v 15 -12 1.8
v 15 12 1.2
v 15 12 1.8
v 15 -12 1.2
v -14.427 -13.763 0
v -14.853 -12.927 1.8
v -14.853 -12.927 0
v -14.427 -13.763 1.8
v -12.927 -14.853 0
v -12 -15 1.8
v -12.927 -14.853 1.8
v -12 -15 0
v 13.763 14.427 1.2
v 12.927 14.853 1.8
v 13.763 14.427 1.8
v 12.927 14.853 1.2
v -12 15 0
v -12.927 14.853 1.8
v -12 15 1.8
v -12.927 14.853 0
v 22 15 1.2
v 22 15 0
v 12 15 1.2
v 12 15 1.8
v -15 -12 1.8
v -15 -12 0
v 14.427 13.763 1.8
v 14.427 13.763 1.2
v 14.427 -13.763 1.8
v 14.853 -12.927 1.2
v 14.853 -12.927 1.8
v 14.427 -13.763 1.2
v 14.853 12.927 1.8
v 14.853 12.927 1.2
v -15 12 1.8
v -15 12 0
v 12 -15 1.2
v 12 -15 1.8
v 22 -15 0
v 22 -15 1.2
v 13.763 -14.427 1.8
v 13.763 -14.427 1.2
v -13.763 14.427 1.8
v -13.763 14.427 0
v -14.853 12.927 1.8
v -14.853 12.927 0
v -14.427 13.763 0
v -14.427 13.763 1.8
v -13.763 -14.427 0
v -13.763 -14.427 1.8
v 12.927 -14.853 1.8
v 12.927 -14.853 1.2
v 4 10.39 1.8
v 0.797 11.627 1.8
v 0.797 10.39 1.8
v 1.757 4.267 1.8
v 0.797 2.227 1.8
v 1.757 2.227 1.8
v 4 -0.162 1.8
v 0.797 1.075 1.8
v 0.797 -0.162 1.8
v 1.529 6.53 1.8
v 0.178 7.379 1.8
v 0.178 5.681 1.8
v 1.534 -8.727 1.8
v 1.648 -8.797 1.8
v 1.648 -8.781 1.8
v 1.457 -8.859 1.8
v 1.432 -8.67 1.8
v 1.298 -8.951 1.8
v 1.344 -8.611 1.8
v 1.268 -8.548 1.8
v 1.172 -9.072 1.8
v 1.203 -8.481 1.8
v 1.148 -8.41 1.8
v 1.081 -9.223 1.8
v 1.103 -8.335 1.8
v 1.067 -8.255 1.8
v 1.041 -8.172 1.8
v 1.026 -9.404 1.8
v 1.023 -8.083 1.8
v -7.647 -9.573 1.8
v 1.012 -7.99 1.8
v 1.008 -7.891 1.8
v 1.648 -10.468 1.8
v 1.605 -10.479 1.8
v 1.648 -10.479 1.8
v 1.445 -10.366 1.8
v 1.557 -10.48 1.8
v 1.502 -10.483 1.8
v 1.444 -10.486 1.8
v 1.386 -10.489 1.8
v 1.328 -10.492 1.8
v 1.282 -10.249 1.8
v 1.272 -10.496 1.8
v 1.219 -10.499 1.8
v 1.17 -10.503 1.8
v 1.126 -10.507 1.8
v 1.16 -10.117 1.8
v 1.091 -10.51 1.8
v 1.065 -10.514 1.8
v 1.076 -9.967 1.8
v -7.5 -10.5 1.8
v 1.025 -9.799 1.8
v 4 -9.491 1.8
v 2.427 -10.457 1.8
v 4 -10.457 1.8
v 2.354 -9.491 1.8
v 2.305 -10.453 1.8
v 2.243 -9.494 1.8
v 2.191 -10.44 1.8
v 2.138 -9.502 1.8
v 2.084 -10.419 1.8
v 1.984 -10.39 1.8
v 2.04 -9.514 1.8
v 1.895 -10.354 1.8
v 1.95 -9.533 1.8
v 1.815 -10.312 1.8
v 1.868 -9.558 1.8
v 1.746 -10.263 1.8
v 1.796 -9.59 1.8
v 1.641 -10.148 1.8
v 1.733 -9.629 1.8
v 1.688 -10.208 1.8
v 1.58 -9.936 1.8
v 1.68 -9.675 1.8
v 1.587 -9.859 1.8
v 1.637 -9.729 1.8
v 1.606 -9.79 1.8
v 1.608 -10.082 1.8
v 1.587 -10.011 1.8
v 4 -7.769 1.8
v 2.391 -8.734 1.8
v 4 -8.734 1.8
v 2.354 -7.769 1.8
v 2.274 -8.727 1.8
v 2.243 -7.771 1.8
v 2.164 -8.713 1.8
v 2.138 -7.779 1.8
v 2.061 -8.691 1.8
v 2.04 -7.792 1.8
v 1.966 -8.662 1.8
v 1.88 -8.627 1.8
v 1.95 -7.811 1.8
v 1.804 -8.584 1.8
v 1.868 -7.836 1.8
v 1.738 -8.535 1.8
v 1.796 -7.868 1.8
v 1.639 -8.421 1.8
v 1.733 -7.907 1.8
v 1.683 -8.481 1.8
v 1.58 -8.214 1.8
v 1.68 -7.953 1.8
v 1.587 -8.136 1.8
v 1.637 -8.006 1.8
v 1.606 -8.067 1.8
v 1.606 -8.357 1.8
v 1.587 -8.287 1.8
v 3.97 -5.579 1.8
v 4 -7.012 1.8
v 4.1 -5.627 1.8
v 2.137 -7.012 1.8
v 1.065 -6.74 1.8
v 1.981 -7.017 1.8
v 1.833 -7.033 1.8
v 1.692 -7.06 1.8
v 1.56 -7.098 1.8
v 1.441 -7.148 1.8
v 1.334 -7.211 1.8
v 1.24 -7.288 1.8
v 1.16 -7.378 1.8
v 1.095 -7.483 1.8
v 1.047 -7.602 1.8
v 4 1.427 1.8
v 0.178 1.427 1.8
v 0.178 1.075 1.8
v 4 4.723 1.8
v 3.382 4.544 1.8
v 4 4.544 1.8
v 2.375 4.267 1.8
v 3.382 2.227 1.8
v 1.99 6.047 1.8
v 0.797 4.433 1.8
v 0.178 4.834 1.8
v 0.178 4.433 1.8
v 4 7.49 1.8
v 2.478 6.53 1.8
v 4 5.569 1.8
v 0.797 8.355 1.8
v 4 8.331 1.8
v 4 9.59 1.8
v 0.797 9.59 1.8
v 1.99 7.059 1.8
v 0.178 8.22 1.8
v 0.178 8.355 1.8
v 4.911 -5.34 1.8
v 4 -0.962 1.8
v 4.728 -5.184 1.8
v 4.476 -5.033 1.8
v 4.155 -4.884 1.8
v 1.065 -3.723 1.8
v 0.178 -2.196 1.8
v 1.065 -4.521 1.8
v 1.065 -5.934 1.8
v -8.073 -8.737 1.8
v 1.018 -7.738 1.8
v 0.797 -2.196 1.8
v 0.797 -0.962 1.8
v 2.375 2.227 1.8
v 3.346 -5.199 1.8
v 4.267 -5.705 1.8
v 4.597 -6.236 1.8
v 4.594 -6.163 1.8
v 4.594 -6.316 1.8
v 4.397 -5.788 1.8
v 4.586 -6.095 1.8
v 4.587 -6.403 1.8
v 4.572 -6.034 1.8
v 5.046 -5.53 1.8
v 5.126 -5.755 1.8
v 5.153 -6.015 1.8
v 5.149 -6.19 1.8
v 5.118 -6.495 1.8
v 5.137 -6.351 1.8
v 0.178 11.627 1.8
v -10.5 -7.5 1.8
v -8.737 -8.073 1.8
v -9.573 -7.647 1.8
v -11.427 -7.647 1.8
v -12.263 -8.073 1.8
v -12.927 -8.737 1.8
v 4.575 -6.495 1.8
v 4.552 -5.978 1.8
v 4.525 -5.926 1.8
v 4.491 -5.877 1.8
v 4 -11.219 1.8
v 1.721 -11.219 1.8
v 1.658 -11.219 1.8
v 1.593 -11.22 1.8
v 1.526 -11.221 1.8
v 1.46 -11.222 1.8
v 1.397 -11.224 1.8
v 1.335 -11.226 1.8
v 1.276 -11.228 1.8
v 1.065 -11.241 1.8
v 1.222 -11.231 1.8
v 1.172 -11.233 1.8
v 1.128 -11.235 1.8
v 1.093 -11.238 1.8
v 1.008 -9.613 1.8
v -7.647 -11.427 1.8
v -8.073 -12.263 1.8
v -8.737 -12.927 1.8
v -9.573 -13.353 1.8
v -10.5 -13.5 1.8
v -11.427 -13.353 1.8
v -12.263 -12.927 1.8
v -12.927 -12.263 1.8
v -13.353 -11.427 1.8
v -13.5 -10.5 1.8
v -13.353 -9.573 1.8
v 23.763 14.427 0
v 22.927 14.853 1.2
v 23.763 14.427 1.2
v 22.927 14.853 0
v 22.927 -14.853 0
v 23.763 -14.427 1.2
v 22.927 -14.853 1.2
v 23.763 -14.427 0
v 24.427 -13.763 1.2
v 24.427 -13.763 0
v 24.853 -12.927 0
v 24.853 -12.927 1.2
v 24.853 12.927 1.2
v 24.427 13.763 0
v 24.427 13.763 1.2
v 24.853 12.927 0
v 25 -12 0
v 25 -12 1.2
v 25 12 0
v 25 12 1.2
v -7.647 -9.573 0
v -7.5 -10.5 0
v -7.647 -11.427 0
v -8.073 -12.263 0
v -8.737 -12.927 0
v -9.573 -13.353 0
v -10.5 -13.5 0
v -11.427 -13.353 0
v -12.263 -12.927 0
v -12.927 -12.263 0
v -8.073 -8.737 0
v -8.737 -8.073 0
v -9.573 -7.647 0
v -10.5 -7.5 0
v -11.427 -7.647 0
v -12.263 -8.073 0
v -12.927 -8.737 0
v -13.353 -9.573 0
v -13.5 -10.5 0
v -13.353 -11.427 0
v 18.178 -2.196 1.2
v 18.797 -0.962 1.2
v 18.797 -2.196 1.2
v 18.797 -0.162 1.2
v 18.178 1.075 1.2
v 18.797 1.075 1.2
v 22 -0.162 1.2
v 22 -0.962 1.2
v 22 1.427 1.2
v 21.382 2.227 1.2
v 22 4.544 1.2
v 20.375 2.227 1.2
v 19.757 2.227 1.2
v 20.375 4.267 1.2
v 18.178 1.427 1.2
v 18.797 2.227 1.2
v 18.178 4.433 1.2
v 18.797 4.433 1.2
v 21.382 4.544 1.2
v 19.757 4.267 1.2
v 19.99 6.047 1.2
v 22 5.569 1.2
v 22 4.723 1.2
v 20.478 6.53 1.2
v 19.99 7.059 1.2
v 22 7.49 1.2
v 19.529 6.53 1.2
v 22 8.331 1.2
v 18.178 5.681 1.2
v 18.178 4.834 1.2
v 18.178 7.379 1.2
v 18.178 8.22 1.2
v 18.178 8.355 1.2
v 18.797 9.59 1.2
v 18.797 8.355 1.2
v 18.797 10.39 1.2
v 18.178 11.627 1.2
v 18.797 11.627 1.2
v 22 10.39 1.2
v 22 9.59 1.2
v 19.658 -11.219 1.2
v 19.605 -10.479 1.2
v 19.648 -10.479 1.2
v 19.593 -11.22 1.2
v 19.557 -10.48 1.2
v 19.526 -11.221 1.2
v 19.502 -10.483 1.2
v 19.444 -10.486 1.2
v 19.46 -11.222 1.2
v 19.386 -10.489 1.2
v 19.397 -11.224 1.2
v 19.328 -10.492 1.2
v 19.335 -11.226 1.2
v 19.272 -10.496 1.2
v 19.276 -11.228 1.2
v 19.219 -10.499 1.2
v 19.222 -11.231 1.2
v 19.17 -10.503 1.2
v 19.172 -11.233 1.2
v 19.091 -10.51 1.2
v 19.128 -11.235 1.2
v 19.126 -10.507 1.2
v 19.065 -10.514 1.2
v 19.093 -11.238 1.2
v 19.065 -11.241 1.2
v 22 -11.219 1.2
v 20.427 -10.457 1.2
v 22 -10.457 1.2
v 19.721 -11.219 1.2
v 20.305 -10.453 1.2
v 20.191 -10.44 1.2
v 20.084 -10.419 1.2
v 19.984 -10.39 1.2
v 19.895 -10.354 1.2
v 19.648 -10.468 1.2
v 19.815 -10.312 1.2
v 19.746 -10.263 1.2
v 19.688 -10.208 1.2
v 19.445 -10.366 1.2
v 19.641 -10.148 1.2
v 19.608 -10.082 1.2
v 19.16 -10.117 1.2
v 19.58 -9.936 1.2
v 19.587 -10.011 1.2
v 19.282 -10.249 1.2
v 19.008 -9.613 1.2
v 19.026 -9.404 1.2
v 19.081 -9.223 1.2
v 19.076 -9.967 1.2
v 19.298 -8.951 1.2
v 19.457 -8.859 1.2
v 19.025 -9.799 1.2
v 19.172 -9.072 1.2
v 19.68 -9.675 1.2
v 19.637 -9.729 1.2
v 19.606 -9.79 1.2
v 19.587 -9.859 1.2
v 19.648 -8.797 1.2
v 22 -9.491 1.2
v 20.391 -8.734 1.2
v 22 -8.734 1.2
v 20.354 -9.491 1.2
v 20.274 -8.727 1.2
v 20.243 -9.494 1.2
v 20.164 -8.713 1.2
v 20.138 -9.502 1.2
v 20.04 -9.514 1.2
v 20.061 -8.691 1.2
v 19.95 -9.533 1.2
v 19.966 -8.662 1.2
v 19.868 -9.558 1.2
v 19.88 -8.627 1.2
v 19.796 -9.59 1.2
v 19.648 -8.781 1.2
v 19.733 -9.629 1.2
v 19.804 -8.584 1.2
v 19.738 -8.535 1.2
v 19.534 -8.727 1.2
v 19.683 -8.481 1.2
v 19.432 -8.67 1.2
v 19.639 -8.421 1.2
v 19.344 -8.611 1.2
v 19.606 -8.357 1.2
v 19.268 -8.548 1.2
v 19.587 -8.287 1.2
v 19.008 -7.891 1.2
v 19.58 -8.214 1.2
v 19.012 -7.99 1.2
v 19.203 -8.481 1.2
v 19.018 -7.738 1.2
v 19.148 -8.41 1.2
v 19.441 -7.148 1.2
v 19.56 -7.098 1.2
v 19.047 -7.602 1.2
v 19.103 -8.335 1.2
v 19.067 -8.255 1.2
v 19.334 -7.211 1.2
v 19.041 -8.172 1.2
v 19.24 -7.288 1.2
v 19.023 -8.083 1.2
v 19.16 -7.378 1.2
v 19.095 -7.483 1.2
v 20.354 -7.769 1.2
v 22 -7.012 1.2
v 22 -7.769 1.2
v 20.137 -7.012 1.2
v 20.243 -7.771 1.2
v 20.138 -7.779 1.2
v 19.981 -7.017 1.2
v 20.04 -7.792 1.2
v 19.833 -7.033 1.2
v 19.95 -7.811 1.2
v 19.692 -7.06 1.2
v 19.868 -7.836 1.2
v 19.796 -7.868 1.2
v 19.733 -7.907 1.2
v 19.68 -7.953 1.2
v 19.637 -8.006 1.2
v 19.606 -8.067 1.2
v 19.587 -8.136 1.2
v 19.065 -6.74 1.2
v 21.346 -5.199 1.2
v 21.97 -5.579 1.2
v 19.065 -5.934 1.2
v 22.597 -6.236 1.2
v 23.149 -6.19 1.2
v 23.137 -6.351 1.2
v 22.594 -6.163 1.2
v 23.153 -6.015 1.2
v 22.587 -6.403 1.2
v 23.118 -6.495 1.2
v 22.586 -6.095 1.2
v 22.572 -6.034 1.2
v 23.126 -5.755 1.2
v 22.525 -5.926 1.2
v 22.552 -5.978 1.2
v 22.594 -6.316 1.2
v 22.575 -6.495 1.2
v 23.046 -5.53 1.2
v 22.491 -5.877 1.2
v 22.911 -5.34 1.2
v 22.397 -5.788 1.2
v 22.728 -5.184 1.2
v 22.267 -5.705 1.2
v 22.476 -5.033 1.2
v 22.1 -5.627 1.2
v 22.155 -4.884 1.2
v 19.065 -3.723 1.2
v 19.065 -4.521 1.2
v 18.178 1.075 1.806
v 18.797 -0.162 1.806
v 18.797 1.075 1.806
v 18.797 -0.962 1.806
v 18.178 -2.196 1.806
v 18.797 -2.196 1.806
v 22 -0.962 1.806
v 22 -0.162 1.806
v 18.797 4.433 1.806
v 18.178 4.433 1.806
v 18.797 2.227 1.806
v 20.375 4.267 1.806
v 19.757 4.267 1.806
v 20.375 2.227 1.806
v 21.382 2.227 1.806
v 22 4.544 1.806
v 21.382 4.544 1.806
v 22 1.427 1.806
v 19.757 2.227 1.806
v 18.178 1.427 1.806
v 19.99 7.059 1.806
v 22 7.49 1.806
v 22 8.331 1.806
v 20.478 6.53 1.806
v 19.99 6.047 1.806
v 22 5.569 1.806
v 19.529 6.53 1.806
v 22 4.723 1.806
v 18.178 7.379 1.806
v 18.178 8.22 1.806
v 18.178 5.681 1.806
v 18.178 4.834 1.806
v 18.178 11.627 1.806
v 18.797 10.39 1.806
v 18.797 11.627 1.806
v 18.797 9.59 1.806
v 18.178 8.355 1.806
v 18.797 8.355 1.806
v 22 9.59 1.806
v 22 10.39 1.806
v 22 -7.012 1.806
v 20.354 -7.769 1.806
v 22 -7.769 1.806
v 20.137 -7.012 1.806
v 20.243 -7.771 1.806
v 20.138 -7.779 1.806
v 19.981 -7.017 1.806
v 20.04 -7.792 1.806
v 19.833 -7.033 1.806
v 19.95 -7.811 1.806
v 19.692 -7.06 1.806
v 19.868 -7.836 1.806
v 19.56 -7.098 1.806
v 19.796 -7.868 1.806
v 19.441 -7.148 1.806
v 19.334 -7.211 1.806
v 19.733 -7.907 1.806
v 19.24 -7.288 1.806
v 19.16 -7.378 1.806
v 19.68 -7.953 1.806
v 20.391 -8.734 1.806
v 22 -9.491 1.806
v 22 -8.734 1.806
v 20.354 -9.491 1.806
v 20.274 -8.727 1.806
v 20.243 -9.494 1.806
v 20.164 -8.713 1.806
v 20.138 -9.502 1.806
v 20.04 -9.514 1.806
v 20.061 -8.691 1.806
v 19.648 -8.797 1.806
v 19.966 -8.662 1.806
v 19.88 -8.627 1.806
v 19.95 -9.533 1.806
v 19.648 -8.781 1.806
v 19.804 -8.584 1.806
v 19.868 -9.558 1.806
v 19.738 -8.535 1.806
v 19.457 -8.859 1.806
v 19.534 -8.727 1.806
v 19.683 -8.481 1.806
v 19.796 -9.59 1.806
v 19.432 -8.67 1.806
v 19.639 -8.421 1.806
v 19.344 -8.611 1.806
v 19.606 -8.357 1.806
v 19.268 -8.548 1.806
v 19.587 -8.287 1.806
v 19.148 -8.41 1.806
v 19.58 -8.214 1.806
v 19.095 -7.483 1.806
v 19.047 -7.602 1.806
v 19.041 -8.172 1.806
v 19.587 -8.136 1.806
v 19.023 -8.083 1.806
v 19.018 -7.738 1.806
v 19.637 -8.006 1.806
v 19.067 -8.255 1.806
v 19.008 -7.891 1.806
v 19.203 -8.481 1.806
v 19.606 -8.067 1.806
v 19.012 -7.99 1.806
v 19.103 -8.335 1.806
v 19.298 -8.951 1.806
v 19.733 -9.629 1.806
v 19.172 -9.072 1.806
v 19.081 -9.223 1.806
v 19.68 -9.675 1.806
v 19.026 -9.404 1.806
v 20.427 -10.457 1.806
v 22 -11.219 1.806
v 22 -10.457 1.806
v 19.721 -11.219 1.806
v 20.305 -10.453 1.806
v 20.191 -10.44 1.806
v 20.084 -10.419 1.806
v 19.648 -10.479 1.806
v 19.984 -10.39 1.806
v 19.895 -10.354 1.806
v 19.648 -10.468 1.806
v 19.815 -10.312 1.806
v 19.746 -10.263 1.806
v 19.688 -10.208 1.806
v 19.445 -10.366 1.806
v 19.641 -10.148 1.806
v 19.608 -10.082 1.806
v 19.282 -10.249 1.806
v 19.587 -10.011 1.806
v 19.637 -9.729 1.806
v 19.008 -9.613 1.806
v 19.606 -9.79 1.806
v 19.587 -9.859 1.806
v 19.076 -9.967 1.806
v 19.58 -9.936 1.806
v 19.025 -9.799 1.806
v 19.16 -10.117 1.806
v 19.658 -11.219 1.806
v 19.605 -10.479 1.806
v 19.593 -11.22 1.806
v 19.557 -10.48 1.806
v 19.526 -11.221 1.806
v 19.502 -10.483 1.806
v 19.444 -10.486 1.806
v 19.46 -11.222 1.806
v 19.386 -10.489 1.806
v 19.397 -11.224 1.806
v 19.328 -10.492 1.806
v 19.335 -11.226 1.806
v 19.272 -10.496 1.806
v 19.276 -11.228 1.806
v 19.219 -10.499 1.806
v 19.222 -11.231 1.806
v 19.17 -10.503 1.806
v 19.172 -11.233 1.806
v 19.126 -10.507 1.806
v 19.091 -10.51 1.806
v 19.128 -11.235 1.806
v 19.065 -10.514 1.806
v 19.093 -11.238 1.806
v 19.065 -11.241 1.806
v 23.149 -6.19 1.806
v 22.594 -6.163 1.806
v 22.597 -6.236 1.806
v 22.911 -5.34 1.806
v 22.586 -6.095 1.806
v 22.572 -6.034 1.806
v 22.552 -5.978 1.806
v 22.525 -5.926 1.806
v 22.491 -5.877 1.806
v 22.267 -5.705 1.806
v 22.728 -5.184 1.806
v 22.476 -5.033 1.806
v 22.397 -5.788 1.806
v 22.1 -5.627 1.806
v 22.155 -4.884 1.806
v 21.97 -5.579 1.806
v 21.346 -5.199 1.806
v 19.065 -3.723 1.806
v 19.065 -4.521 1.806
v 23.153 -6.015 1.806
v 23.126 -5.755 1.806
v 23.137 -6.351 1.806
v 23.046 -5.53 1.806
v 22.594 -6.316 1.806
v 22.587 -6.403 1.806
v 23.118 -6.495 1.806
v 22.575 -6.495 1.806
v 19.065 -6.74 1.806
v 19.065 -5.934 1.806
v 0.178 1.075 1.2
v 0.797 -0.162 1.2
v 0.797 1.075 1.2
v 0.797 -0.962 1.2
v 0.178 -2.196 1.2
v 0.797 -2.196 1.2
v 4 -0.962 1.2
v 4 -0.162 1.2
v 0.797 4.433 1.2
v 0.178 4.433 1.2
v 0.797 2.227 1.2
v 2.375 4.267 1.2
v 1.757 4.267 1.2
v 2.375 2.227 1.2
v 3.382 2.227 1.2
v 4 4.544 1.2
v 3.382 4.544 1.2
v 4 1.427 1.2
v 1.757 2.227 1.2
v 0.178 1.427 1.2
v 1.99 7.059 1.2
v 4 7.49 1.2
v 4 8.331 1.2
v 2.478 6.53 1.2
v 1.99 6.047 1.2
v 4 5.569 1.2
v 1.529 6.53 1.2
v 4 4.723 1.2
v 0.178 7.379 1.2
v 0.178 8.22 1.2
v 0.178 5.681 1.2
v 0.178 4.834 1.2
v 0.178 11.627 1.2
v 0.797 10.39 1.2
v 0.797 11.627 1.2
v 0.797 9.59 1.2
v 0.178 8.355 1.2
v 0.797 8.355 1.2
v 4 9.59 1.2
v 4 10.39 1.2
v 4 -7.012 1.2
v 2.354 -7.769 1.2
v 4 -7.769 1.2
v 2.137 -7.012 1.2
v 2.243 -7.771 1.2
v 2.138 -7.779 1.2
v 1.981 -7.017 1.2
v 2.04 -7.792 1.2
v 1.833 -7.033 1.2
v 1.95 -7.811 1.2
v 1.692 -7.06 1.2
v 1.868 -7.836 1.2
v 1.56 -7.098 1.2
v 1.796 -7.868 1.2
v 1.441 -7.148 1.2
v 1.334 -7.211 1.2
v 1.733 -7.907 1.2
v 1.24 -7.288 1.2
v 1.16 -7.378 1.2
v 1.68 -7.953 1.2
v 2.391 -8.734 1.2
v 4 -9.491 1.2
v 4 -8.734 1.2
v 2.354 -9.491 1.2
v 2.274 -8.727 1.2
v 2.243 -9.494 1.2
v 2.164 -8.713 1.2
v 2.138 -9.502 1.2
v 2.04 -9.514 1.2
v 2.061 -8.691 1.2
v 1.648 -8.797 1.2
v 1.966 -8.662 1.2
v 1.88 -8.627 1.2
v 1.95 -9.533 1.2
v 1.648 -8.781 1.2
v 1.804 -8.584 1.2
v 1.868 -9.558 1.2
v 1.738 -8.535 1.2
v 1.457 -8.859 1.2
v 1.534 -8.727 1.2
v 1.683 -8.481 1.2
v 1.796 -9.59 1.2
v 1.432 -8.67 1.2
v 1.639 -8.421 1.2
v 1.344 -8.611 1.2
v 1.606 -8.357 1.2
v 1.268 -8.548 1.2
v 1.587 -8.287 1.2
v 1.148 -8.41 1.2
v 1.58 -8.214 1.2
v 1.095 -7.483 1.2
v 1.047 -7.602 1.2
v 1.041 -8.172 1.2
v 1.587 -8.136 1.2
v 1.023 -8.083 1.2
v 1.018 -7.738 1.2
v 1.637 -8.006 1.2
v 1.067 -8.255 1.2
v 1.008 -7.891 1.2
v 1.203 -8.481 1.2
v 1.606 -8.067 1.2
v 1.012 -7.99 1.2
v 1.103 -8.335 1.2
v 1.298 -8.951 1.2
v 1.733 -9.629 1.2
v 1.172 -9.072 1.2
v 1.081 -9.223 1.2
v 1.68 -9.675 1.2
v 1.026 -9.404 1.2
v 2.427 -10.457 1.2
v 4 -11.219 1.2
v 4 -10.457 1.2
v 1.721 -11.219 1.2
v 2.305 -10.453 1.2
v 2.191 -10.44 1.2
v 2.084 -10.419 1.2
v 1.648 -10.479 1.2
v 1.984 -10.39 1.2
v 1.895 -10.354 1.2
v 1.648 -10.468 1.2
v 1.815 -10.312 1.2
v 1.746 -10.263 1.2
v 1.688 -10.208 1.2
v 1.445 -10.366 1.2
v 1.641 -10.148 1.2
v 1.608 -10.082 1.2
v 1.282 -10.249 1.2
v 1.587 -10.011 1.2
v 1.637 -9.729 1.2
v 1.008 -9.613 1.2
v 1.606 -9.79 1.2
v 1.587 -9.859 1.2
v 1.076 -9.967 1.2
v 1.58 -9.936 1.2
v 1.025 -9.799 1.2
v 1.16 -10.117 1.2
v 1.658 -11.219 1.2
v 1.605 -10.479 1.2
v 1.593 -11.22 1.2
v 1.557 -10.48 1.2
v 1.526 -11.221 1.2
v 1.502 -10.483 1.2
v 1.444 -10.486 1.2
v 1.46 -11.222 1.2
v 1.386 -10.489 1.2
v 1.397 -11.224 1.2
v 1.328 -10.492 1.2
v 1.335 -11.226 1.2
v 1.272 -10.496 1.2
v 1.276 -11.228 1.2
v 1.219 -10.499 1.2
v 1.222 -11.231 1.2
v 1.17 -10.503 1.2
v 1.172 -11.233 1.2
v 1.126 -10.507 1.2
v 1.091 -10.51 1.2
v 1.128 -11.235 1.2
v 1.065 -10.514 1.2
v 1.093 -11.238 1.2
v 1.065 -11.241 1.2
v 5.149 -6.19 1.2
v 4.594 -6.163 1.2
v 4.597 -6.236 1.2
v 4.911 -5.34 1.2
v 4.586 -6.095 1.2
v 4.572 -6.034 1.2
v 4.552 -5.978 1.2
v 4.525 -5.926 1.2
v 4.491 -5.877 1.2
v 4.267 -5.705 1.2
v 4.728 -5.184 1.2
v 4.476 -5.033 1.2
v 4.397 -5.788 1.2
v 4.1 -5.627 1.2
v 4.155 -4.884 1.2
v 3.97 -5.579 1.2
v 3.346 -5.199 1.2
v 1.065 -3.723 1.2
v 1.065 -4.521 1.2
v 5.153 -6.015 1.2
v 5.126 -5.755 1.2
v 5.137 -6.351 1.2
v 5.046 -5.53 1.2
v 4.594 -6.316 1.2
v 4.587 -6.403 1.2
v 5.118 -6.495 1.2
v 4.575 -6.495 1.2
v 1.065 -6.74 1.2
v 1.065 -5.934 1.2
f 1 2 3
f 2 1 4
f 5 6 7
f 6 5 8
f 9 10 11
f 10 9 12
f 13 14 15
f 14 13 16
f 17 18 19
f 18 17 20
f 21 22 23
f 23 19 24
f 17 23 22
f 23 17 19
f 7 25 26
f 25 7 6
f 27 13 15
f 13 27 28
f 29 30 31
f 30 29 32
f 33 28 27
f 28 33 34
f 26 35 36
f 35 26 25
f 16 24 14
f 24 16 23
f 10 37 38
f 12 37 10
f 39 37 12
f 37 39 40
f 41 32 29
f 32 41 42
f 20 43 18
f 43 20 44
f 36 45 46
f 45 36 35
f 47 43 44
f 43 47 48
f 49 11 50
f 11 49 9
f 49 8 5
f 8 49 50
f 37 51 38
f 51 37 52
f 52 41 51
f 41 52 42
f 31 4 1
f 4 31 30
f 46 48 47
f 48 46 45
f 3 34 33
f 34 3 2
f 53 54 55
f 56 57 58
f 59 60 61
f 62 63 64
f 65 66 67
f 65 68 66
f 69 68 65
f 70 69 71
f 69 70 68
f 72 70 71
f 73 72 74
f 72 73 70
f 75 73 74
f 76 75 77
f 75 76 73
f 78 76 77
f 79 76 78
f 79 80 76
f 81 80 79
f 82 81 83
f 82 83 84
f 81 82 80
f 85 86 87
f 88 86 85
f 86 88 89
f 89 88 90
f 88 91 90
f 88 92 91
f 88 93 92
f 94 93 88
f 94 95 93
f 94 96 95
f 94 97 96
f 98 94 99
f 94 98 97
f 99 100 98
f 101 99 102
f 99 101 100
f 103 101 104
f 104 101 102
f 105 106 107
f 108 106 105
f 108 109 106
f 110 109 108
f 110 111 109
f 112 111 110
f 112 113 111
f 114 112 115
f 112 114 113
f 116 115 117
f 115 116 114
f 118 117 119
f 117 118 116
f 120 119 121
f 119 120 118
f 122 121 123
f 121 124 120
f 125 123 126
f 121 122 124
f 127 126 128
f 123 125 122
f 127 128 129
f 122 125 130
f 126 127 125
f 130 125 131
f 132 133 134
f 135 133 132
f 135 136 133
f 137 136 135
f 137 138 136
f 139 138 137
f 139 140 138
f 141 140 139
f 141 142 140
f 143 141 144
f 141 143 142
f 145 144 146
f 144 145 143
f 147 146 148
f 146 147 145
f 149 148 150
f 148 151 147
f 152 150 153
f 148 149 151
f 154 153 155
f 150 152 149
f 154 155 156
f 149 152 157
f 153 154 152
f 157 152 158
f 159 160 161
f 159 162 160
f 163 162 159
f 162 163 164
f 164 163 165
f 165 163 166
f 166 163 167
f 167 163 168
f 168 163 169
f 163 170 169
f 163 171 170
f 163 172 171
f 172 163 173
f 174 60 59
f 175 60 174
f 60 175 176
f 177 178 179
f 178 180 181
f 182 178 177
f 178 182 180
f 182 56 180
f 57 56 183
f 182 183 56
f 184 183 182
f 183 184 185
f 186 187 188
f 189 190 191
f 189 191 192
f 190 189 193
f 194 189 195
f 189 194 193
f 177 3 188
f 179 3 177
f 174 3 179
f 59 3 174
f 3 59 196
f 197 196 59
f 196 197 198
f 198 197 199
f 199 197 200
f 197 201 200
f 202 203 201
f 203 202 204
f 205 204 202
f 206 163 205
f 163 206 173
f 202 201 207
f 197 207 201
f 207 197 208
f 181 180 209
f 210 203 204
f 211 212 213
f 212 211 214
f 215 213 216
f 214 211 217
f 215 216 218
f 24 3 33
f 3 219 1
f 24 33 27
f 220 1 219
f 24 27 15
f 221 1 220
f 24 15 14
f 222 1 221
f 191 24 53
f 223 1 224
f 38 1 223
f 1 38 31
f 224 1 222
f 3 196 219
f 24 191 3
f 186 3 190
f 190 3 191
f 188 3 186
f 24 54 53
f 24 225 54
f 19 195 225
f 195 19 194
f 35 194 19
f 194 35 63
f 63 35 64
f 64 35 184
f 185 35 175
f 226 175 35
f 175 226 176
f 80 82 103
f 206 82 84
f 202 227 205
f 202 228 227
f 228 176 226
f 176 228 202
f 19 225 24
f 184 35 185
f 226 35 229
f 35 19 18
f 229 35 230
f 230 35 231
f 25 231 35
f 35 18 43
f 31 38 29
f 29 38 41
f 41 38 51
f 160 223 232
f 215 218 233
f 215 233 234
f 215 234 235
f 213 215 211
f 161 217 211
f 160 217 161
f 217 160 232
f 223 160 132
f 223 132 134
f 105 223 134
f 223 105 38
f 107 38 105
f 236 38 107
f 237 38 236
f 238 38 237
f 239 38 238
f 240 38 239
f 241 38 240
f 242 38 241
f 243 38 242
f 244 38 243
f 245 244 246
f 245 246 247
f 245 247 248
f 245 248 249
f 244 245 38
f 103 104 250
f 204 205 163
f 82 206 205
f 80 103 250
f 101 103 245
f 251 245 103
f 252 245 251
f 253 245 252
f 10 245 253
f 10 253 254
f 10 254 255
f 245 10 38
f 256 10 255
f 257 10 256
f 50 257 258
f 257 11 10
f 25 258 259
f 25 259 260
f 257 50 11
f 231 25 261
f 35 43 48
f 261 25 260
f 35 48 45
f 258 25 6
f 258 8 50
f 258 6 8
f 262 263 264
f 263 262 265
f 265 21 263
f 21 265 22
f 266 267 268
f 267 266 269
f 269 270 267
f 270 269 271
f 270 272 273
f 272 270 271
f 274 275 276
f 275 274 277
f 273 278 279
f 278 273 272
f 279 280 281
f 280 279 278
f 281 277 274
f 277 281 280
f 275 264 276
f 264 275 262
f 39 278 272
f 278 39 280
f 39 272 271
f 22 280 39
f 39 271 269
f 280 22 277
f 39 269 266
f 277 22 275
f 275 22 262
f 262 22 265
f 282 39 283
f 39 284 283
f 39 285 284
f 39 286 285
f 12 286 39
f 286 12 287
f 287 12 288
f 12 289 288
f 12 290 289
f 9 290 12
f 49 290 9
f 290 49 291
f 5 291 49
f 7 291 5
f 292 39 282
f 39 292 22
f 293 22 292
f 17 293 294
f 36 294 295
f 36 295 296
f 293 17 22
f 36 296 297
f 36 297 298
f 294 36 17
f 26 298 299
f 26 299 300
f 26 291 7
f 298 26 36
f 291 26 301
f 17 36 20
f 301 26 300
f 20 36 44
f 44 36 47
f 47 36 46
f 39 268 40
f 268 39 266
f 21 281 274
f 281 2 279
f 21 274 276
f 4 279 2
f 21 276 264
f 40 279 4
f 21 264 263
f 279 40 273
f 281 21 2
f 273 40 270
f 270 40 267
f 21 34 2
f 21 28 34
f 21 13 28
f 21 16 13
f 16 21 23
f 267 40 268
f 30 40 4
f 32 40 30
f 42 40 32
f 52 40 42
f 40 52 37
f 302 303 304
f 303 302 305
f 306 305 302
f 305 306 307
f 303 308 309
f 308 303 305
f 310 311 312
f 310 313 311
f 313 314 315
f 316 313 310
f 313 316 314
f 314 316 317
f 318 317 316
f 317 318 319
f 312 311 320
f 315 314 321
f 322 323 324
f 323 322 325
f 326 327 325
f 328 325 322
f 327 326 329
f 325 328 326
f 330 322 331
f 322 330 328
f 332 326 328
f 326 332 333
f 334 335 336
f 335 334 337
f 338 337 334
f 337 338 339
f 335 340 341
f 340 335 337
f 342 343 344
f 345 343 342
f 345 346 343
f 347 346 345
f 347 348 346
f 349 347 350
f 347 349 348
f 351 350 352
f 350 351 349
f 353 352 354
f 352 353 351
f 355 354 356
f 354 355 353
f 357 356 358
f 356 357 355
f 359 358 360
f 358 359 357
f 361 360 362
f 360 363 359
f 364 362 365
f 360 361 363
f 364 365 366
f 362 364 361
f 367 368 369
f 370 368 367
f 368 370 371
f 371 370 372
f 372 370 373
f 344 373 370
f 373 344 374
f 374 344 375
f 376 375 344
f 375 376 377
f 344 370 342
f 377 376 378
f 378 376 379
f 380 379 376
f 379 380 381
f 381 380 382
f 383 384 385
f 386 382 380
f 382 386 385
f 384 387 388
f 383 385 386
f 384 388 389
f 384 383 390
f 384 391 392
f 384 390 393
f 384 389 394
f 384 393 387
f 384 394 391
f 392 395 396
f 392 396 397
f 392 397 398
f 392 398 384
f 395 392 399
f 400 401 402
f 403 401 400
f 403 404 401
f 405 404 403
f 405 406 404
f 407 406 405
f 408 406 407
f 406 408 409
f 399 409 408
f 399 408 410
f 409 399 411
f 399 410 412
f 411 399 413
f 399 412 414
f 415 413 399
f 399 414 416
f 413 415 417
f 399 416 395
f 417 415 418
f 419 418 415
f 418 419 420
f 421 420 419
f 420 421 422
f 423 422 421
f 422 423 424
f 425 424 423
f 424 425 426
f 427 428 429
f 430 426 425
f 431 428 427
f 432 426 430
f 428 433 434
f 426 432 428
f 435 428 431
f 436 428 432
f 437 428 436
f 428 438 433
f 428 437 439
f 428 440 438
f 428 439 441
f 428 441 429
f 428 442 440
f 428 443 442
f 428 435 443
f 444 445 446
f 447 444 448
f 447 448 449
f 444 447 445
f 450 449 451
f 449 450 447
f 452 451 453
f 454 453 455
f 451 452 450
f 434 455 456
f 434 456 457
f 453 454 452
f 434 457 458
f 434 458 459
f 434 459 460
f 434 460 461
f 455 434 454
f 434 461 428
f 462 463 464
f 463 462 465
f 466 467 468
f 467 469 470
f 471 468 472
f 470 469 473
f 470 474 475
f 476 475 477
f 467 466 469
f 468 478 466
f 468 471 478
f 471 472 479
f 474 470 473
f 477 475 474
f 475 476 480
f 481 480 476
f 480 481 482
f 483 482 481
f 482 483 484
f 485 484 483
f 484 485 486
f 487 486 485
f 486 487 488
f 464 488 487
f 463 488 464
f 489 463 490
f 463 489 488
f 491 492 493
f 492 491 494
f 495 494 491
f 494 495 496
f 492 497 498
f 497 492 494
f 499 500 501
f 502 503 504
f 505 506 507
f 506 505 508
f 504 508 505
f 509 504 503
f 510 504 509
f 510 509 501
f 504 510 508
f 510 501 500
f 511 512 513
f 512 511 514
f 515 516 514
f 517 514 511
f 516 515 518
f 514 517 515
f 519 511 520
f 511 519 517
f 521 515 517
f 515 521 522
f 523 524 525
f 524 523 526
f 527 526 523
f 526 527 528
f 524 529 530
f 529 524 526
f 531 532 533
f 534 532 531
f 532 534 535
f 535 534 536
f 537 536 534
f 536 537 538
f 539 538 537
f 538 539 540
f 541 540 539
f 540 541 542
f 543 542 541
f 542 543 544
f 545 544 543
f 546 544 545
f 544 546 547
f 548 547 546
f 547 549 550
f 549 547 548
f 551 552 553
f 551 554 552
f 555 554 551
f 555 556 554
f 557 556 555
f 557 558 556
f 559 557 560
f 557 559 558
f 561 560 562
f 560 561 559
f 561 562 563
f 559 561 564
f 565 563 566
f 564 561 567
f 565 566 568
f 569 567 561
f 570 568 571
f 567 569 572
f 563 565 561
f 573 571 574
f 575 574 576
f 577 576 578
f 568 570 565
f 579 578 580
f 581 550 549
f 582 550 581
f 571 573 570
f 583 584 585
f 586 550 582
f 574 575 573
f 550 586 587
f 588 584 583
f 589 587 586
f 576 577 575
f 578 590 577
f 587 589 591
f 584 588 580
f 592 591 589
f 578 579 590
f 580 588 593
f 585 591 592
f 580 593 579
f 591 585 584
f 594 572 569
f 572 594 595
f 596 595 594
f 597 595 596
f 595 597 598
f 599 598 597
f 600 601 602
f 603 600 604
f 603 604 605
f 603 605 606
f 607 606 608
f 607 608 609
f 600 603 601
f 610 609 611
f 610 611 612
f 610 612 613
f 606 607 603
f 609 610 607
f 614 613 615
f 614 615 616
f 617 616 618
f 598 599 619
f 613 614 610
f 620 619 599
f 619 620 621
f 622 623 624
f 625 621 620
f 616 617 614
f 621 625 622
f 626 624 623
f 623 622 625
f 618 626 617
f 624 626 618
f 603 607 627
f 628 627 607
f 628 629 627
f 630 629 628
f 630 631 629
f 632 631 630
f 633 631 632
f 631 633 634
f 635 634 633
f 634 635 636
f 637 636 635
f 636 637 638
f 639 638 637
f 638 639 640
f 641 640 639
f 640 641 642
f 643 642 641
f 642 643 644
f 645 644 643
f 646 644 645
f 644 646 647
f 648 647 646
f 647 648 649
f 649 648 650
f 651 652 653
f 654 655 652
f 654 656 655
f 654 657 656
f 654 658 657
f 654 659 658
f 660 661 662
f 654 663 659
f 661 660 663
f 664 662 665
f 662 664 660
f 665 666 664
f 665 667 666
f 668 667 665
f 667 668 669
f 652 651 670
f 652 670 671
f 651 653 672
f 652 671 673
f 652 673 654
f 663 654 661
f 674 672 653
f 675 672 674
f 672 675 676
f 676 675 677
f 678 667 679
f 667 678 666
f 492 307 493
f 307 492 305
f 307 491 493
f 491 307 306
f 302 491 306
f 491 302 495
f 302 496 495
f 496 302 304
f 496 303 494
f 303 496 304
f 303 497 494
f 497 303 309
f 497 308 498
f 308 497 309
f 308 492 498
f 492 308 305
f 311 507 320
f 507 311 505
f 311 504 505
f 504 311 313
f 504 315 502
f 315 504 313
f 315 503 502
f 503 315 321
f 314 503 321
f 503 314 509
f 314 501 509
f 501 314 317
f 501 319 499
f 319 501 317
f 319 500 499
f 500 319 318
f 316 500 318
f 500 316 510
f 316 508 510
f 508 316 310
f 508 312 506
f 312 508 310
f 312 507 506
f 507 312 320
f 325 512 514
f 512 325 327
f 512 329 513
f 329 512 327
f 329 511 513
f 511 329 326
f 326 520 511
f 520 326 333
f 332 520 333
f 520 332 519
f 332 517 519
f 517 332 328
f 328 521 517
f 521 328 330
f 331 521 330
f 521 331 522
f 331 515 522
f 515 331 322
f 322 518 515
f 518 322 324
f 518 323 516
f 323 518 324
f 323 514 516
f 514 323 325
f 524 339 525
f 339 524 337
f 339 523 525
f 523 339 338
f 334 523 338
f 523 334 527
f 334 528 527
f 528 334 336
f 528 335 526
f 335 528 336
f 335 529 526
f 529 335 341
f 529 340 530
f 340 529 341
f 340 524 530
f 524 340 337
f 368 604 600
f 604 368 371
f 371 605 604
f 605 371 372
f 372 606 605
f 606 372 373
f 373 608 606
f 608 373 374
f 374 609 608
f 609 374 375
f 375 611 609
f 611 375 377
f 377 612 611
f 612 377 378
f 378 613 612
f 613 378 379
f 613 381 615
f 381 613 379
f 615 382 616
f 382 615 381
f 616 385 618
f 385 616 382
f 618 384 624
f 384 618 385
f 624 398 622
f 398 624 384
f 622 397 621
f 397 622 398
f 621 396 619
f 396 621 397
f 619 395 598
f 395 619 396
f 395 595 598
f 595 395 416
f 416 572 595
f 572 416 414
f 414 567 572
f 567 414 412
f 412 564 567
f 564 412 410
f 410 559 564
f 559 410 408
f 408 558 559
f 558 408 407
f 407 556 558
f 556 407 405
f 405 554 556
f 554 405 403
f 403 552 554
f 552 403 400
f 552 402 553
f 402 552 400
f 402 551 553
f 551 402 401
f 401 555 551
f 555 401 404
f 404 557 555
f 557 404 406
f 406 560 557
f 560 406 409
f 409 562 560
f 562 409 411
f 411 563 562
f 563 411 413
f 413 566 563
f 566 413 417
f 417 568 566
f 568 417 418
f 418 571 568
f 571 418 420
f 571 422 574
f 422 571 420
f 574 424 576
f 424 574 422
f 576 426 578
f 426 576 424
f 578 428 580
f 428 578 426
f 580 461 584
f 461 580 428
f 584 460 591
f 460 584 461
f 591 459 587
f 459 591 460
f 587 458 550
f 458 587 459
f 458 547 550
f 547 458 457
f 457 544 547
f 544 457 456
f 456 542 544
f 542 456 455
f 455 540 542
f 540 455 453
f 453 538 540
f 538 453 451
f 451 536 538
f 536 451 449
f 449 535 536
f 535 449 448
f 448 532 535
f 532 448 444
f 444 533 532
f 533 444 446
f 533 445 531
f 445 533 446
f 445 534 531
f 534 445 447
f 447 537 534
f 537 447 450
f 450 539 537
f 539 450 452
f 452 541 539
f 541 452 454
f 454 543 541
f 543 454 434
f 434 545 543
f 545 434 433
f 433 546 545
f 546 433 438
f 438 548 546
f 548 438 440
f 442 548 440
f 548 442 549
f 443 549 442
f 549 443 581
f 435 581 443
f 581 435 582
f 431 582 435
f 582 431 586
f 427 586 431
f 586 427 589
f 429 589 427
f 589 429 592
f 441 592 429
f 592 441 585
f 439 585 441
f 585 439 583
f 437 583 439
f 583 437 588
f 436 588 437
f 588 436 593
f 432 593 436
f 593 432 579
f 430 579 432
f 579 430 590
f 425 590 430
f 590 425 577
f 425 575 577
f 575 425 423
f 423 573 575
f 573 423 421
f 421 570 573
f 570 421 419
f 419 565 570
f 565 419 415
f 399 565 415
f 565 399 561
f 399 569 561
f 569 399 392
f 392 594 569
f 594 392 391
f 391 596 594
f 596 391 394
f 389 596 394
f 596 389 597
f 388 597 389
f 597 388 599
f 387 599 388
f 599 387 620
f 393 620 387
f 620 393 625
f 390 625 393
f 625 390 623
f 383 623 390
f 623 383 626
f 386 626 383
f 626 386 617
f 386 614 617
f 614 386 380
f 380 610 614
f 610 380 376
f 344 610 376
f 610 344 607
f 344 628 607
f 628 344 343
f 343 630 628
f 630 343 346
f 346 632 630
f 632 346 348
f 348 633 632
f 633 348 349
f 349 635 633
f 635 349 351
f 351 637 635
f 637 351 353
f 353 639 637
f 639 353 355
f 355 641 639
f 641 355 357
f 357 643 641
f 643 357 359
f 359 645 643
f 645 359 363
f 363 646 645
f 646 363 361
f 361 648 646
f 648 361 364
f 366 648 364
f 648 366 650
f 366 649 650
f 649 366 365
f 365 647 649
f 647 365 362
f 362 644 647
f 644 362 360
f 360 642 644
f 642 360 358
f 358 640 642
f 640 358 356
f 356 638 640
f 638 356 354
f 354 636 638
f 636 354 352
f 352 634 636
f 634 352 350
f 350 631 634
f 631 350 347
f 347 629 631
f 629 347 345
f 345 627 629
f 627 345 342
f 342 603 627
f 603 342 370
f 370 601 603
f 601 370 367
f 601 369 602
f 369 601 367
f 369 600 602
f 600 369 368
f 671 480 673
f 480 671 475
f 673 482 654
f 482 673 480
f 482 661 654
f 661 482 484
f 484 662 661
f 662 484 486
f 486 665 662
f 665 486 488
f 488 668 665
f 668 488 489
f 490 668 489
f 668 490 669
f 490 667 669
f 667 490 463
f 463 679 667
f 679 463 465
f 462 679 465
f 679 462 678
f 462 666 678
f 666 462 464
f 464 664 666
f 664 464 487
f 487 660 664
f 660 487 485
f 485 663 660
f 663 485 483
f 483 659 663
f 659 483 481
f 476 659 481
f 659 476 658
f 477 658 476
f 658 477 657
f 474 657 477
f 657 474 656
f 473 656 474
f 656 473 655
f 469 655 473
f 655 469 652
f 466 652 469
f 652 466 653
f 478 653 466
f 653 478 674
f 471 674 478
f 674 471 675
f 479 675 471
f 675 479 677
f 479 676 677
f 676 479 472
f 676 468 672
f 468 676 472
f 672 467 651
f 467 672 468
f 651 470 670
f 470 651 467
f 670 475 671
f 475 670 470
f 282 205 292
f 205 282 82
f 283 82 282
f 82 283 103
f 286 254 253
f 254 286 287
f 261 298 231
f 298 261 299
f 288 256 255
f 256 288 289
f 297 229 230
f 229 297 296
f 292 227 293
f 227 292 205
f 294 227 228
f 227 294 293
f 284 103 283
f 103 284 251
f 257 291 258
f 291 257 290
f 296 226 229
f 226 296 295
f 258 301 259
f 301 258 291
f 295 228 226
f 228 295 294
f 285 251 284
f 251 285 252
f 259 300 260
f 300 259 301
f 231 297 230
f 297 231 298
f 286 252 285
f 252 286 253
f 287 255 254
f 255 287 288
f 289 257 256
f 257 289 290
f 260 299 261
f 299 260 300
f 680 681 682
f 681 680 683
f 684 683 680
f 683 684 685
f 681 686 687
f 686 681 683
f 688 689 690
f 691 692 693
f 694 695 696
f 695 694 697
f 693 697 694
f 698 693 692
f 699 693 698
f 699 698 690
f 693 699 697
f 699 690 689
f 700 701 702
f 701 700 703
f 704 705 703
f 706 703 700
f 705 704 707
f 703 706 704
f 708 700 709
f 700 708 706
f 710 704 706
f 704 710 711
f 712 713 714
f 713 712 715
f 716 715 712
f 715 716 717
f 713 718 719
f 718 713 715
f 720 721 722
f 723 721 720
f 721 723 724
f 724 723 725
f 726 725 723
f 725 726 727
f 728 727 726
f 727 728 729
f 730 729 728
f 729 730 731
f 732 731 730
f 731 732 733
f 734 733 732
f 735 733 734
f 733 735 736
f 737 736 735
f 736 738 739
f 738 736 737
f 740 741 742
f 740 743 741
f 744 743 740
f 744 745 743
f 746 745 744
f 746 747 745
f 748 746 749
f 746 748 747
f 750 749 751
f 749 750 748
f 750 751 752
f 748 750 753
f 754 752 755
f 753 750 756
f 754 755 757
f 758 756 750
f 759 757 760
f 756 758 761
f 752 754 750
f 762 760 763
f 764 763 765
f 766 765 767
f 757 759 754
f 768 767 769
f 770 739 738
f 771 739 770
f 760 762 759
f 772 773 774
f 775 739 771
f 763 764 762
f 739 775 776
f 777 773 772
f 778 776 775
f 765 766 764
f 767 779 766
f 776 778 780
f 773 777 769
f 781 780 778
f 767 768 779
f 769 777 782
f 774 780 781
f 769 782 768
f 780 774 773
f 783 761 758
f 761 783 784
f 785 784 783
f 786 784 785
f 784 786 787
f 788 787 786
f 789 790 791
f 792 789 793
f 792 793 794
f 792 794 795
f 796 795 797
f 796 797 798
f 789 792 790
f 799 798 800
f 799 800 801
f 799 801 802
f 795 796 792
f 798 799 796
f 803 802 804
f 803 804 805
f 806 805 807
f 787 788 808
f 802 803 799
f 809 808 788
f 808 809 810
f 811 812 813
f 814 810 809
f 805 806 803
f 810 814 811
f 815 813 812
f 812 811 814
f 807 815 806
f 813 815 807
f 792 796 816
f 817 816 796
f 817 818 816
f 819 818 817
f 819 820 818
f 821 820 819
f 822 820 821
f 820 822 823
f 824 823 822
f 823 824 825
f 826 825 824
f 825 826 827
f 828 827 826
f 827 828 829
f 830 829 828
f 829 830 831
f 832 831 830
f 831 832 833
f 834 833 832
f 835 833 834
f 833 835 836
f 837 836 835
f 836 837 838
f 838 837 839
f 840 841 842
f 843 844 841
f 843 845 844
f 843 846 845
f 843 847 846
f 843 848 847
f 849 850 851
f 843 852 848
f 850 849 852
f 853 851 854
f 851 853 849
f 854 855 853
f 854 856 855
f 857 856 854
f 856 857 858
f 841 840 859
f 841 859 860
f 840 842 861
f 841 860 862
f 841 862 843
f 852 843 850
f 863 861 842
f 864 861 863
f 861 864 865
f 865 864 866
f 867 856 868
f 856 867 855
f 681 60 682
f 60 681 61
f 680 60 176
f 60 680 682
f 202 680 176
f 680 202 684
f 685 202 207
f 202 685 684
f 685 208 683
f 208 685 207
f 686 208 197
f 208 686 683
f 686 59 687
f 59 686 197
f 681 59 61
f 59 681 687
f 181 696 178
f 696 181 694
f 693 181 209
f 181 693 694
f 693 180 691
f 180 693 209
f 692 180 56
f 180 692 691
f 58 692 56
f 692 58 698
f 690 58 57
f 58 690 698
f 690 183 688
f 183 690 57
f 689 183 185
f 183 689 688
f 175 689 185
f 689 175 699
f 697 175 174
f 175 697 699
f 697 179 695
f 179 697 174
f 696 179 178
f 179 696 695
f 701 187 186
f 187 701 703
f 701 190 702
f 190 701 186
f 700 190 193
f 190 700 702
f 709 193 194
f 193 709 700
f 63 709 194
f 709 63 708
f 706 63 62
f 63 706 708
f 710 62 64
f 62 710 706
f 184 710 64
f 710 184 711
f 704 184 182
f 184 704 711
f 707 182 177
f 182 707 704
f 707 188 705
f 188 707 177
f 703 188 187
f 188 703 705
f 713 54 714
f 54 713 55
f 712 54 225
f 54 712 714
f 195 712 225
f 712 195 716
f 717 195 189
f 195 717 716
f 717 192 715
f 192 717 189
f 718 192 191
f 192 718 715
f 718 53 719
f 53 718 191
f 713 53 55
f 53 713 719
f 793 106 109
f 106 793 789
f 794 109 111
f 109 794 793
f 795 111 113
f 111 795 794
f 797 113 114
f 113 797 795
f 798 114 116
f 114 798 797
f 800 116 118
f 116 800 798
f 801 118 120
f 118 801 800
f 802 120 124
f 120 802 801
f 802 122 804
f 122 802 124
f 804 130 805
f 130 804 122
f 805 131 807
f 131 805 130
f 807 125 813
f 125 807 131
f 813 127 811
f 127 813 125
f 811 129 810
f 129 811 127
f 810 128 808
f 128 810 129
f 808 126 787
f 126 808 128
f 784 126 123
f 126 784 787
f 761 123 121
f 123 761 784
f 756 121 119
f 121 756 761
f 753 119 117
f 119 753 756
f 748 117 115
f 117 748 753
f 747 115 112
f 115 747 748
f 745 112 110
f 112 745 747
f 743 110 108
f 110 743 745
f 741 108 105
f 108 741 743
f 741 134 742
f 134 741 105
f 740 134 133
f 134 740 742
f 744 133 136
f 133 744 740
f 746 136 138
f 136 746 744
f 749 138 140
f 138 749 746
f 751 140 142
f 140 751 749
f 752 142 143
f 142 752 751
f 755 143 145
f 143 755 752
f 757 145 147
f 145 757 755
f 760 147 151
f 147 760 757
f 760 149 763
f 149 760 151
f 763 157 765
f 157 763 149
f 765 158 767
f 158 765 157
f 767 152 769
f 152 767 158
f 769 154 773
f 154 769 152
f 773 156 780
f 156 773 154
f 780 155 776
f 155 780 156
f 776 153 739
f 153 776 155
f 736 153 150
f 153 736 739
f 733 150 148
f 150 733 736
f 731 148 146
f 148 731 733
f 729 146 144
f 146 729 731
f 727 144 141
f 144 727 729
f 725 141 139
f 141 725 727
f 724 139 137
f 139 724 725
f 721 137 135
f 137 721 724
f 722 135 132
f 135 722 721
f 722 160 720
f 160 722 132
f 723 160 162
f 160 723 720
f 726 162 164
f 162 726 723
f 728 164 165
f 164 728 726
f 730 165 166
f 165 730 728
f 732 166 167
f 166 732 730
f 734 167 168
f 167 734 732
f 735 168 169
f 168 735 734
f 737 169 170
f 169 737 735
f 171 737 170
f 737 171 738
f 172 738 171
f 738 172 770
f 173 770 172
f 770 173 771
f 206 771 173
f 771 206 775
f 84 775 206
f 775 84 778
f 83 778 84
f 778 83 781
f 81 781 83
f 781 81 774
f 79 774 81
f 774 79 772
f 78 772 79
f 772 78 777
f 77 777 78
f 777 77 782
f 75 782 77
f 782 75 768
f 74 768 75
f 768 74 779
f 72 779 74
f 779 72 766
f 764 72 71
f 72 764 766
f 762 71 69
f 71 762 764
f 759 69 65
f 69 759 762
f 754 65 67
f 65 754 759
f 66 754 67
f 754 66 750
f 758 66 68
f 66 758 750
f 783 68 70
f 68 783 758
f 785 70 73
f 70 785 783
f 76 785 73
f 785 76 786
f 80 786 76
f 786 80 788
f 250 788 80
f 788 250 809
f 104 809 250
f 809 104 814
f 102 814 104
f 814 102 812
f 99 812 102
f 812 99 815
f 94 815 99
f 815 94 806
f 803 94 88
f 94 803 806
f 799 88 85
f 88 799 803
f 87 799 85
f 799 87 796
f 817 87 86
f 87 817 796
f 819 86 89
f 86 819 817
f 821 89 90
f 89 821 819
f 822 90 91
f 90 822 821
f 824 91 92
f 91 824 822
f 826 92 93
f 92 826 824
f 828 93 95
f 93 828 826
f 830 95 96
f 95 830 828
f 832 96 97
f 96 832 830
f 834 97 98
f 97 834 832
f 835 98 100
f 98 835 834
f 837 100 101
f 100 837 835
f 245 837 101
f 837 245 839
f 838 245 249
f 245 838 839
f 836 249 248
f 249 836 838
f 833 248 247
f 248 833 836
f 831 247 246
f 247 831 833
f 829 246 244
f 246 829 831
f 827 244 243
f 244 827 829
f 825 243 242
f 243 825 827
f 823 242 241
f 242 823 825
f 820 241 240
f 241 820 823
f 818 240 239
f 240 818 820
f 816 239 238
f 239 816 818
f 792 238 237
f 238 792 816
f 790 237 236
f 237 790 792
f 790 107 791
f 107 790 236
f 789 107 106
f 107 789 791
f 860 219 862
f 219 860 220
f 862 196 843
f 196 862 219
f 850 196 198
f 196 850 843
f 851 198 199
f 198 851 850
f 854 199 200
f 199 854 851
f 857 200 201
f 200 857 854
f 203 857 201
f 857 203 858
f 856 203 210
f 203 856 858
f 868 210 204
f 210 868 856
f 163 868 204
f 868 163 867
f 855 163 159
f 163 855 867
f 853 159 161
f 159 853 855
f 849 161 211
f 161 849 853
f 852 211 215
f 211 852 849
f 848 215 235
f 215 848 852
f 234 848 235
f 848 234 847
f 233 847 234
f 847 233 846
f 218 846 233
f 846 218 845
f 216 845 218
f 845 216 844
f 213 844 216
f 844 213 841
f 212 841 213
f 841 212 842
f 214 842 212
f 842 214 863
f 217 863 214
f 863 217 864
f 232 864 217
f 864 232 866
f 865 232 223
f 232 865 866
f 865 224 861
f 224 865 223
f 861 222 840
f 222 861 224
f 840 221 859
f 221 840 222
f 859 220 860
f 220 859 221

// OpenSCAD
// (c) 2019 Pavel Suchmann <pavel@suchmann.cz>
// Licensed under the terms of "Creative Commons - Public Domain Dedication"
// Open source remix of Khan's thing: https://www.thingiverse.com/thing:318679

// overall approximate size (mm)
size = 24; // [20:40]

// your text
label = "my TEXT";

/* [Hidden] */

h = 0.6;
d = 10;
r = 3;
fs = 4;

$fn=20;

module message(txt, shift) {
    rotate([0, 0, 90])
        translate([size/2, -shift, h])
            linear_extrude(h*1.01)
                text(txt, fs, halign="center", font="Liberation Sans:style=Bold");
}

translate([-size/2, -size/2, h])
    difference() {
        union() {
            minkowski() {
                cube([size, size, h]);
                cylinder(r=r, h=h);
            }
            translate([0, 0, -h])
                minkowski() {
                    cube([size+d, size, h]);
                    cylinder(r=r, h=h);
                }
            message(label, size+d);    
        }
        union() {
            translate([r/2, r/2, -2*h])
                cylinder(r=r, h=5*h);
            message(label, size*2/3);
        }
    }
